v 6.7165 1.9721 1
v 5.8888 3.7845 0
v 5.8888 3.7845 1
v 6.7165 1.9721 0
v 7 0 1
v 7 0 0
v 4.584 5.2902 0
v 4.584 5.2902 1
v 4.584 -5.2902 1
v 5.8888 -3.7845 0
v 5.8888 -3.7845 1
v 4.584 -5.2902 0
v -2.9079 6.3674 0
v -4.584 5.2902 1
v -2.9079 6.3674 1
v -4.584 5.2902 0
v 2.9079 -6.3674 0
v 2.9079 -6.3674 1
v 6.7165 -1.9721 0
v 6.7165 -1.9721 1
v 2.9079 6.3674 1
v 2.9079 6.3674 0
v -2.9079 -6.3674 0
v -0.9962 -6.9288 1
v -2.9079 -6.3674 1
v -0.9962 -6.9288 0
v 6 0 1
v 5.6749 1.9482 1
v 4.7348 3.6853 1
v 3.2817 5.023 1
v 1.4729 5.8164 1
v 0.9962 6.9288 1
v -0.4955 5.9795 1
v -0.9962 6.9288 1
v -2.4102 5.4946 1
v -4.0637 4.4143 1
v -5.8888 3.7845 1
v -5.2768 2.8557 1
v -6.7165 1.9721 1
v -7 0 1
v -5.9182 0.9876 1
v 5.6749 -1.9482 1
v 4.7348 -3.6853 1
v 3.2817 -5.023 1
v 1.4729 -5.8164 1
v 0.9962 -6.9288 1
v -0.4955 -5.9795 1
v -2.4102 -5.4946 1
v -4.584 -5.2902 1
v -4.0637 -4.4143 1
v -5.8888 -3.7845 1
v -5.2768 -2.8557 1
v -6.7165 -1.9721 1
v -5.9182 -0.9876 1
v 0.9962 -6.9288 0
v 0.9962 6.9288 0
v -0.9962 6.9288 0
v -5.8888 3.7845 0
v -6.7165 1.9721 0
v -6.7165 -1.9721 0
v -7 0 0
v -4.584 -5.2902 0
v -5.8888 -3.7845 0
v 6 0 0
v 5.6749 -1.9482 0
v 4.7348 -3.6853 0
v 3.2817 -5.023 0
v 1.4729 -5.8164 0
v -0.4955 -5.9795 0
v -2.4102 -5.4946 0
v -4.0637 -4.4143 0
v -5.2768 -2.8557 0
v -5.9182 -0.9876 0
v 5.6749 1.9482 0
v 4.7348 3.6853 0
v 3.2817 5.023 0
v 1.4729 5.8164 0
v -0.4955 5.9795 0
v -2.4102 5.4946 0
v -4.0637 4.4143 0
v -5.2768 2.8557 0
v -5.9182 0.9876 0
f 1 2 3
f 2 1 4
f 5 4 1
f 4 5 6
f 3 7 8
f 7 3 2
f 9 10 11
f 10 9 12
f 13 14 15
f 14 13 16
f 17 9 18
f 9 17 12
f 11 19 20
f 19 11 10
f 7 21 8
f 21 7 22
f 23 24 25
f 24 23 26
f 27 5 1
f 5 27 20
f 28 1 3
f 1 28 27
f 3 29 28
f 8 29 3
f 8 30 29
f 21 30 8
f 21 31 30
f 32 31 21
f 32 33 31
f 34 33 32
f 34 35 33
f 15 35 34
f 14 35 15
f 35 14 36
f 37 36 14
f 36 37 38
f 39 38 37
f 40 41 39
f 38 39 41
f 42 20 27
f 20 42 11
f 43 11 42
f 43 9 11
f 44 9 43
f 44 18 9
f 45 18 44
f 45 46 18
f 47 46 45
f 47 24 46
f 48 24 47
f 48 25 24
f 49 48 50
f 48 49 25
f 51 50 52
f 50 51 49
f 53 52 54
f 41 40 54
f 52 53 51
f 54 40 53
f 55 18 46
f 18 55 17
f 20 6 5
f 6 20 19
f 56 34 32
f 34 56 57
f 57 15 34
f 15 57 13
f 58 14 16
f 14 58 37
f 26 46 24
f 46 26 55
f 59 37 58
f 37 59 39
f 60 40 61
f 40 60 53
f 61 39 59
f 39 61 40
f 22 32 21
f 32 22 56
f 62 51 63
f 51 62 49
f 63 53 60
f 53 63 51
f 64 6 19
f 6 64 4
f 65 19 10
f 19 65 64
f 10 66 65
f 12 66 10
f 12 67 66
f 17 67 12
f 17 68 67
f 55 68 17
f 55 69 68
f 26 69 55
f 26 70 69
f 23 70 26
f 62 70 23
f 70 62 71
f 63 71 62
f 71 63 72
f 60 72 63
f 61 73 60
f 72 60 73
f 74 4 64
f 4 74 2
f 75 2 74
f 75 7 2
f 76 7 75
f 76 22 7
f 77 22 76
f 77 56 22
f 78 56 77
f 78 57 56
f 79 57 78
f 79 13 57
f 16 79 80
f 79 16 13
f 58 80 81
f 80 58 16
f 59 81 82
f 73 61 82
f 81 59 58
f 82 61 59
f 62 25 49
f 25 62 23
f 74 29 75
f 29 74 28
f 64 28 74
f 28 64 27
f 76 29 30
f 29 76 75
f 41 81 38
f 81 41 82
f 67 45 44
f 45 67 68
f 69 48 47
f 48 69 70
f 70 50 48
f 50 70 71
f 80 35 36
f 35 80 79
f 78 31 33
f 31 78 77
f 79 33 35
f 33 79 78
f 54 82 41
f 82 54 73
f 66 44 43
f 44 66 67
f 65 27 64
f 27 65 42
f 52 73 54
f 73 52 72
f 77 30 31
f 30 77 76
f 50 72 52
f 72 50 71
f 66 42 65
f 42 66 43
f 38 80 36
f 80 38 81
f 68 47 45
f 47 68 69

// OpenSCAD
difference() {
    cylinder(1, 7, 7, center = false);
    cylinder(3, 6, 6, center = true);
}
